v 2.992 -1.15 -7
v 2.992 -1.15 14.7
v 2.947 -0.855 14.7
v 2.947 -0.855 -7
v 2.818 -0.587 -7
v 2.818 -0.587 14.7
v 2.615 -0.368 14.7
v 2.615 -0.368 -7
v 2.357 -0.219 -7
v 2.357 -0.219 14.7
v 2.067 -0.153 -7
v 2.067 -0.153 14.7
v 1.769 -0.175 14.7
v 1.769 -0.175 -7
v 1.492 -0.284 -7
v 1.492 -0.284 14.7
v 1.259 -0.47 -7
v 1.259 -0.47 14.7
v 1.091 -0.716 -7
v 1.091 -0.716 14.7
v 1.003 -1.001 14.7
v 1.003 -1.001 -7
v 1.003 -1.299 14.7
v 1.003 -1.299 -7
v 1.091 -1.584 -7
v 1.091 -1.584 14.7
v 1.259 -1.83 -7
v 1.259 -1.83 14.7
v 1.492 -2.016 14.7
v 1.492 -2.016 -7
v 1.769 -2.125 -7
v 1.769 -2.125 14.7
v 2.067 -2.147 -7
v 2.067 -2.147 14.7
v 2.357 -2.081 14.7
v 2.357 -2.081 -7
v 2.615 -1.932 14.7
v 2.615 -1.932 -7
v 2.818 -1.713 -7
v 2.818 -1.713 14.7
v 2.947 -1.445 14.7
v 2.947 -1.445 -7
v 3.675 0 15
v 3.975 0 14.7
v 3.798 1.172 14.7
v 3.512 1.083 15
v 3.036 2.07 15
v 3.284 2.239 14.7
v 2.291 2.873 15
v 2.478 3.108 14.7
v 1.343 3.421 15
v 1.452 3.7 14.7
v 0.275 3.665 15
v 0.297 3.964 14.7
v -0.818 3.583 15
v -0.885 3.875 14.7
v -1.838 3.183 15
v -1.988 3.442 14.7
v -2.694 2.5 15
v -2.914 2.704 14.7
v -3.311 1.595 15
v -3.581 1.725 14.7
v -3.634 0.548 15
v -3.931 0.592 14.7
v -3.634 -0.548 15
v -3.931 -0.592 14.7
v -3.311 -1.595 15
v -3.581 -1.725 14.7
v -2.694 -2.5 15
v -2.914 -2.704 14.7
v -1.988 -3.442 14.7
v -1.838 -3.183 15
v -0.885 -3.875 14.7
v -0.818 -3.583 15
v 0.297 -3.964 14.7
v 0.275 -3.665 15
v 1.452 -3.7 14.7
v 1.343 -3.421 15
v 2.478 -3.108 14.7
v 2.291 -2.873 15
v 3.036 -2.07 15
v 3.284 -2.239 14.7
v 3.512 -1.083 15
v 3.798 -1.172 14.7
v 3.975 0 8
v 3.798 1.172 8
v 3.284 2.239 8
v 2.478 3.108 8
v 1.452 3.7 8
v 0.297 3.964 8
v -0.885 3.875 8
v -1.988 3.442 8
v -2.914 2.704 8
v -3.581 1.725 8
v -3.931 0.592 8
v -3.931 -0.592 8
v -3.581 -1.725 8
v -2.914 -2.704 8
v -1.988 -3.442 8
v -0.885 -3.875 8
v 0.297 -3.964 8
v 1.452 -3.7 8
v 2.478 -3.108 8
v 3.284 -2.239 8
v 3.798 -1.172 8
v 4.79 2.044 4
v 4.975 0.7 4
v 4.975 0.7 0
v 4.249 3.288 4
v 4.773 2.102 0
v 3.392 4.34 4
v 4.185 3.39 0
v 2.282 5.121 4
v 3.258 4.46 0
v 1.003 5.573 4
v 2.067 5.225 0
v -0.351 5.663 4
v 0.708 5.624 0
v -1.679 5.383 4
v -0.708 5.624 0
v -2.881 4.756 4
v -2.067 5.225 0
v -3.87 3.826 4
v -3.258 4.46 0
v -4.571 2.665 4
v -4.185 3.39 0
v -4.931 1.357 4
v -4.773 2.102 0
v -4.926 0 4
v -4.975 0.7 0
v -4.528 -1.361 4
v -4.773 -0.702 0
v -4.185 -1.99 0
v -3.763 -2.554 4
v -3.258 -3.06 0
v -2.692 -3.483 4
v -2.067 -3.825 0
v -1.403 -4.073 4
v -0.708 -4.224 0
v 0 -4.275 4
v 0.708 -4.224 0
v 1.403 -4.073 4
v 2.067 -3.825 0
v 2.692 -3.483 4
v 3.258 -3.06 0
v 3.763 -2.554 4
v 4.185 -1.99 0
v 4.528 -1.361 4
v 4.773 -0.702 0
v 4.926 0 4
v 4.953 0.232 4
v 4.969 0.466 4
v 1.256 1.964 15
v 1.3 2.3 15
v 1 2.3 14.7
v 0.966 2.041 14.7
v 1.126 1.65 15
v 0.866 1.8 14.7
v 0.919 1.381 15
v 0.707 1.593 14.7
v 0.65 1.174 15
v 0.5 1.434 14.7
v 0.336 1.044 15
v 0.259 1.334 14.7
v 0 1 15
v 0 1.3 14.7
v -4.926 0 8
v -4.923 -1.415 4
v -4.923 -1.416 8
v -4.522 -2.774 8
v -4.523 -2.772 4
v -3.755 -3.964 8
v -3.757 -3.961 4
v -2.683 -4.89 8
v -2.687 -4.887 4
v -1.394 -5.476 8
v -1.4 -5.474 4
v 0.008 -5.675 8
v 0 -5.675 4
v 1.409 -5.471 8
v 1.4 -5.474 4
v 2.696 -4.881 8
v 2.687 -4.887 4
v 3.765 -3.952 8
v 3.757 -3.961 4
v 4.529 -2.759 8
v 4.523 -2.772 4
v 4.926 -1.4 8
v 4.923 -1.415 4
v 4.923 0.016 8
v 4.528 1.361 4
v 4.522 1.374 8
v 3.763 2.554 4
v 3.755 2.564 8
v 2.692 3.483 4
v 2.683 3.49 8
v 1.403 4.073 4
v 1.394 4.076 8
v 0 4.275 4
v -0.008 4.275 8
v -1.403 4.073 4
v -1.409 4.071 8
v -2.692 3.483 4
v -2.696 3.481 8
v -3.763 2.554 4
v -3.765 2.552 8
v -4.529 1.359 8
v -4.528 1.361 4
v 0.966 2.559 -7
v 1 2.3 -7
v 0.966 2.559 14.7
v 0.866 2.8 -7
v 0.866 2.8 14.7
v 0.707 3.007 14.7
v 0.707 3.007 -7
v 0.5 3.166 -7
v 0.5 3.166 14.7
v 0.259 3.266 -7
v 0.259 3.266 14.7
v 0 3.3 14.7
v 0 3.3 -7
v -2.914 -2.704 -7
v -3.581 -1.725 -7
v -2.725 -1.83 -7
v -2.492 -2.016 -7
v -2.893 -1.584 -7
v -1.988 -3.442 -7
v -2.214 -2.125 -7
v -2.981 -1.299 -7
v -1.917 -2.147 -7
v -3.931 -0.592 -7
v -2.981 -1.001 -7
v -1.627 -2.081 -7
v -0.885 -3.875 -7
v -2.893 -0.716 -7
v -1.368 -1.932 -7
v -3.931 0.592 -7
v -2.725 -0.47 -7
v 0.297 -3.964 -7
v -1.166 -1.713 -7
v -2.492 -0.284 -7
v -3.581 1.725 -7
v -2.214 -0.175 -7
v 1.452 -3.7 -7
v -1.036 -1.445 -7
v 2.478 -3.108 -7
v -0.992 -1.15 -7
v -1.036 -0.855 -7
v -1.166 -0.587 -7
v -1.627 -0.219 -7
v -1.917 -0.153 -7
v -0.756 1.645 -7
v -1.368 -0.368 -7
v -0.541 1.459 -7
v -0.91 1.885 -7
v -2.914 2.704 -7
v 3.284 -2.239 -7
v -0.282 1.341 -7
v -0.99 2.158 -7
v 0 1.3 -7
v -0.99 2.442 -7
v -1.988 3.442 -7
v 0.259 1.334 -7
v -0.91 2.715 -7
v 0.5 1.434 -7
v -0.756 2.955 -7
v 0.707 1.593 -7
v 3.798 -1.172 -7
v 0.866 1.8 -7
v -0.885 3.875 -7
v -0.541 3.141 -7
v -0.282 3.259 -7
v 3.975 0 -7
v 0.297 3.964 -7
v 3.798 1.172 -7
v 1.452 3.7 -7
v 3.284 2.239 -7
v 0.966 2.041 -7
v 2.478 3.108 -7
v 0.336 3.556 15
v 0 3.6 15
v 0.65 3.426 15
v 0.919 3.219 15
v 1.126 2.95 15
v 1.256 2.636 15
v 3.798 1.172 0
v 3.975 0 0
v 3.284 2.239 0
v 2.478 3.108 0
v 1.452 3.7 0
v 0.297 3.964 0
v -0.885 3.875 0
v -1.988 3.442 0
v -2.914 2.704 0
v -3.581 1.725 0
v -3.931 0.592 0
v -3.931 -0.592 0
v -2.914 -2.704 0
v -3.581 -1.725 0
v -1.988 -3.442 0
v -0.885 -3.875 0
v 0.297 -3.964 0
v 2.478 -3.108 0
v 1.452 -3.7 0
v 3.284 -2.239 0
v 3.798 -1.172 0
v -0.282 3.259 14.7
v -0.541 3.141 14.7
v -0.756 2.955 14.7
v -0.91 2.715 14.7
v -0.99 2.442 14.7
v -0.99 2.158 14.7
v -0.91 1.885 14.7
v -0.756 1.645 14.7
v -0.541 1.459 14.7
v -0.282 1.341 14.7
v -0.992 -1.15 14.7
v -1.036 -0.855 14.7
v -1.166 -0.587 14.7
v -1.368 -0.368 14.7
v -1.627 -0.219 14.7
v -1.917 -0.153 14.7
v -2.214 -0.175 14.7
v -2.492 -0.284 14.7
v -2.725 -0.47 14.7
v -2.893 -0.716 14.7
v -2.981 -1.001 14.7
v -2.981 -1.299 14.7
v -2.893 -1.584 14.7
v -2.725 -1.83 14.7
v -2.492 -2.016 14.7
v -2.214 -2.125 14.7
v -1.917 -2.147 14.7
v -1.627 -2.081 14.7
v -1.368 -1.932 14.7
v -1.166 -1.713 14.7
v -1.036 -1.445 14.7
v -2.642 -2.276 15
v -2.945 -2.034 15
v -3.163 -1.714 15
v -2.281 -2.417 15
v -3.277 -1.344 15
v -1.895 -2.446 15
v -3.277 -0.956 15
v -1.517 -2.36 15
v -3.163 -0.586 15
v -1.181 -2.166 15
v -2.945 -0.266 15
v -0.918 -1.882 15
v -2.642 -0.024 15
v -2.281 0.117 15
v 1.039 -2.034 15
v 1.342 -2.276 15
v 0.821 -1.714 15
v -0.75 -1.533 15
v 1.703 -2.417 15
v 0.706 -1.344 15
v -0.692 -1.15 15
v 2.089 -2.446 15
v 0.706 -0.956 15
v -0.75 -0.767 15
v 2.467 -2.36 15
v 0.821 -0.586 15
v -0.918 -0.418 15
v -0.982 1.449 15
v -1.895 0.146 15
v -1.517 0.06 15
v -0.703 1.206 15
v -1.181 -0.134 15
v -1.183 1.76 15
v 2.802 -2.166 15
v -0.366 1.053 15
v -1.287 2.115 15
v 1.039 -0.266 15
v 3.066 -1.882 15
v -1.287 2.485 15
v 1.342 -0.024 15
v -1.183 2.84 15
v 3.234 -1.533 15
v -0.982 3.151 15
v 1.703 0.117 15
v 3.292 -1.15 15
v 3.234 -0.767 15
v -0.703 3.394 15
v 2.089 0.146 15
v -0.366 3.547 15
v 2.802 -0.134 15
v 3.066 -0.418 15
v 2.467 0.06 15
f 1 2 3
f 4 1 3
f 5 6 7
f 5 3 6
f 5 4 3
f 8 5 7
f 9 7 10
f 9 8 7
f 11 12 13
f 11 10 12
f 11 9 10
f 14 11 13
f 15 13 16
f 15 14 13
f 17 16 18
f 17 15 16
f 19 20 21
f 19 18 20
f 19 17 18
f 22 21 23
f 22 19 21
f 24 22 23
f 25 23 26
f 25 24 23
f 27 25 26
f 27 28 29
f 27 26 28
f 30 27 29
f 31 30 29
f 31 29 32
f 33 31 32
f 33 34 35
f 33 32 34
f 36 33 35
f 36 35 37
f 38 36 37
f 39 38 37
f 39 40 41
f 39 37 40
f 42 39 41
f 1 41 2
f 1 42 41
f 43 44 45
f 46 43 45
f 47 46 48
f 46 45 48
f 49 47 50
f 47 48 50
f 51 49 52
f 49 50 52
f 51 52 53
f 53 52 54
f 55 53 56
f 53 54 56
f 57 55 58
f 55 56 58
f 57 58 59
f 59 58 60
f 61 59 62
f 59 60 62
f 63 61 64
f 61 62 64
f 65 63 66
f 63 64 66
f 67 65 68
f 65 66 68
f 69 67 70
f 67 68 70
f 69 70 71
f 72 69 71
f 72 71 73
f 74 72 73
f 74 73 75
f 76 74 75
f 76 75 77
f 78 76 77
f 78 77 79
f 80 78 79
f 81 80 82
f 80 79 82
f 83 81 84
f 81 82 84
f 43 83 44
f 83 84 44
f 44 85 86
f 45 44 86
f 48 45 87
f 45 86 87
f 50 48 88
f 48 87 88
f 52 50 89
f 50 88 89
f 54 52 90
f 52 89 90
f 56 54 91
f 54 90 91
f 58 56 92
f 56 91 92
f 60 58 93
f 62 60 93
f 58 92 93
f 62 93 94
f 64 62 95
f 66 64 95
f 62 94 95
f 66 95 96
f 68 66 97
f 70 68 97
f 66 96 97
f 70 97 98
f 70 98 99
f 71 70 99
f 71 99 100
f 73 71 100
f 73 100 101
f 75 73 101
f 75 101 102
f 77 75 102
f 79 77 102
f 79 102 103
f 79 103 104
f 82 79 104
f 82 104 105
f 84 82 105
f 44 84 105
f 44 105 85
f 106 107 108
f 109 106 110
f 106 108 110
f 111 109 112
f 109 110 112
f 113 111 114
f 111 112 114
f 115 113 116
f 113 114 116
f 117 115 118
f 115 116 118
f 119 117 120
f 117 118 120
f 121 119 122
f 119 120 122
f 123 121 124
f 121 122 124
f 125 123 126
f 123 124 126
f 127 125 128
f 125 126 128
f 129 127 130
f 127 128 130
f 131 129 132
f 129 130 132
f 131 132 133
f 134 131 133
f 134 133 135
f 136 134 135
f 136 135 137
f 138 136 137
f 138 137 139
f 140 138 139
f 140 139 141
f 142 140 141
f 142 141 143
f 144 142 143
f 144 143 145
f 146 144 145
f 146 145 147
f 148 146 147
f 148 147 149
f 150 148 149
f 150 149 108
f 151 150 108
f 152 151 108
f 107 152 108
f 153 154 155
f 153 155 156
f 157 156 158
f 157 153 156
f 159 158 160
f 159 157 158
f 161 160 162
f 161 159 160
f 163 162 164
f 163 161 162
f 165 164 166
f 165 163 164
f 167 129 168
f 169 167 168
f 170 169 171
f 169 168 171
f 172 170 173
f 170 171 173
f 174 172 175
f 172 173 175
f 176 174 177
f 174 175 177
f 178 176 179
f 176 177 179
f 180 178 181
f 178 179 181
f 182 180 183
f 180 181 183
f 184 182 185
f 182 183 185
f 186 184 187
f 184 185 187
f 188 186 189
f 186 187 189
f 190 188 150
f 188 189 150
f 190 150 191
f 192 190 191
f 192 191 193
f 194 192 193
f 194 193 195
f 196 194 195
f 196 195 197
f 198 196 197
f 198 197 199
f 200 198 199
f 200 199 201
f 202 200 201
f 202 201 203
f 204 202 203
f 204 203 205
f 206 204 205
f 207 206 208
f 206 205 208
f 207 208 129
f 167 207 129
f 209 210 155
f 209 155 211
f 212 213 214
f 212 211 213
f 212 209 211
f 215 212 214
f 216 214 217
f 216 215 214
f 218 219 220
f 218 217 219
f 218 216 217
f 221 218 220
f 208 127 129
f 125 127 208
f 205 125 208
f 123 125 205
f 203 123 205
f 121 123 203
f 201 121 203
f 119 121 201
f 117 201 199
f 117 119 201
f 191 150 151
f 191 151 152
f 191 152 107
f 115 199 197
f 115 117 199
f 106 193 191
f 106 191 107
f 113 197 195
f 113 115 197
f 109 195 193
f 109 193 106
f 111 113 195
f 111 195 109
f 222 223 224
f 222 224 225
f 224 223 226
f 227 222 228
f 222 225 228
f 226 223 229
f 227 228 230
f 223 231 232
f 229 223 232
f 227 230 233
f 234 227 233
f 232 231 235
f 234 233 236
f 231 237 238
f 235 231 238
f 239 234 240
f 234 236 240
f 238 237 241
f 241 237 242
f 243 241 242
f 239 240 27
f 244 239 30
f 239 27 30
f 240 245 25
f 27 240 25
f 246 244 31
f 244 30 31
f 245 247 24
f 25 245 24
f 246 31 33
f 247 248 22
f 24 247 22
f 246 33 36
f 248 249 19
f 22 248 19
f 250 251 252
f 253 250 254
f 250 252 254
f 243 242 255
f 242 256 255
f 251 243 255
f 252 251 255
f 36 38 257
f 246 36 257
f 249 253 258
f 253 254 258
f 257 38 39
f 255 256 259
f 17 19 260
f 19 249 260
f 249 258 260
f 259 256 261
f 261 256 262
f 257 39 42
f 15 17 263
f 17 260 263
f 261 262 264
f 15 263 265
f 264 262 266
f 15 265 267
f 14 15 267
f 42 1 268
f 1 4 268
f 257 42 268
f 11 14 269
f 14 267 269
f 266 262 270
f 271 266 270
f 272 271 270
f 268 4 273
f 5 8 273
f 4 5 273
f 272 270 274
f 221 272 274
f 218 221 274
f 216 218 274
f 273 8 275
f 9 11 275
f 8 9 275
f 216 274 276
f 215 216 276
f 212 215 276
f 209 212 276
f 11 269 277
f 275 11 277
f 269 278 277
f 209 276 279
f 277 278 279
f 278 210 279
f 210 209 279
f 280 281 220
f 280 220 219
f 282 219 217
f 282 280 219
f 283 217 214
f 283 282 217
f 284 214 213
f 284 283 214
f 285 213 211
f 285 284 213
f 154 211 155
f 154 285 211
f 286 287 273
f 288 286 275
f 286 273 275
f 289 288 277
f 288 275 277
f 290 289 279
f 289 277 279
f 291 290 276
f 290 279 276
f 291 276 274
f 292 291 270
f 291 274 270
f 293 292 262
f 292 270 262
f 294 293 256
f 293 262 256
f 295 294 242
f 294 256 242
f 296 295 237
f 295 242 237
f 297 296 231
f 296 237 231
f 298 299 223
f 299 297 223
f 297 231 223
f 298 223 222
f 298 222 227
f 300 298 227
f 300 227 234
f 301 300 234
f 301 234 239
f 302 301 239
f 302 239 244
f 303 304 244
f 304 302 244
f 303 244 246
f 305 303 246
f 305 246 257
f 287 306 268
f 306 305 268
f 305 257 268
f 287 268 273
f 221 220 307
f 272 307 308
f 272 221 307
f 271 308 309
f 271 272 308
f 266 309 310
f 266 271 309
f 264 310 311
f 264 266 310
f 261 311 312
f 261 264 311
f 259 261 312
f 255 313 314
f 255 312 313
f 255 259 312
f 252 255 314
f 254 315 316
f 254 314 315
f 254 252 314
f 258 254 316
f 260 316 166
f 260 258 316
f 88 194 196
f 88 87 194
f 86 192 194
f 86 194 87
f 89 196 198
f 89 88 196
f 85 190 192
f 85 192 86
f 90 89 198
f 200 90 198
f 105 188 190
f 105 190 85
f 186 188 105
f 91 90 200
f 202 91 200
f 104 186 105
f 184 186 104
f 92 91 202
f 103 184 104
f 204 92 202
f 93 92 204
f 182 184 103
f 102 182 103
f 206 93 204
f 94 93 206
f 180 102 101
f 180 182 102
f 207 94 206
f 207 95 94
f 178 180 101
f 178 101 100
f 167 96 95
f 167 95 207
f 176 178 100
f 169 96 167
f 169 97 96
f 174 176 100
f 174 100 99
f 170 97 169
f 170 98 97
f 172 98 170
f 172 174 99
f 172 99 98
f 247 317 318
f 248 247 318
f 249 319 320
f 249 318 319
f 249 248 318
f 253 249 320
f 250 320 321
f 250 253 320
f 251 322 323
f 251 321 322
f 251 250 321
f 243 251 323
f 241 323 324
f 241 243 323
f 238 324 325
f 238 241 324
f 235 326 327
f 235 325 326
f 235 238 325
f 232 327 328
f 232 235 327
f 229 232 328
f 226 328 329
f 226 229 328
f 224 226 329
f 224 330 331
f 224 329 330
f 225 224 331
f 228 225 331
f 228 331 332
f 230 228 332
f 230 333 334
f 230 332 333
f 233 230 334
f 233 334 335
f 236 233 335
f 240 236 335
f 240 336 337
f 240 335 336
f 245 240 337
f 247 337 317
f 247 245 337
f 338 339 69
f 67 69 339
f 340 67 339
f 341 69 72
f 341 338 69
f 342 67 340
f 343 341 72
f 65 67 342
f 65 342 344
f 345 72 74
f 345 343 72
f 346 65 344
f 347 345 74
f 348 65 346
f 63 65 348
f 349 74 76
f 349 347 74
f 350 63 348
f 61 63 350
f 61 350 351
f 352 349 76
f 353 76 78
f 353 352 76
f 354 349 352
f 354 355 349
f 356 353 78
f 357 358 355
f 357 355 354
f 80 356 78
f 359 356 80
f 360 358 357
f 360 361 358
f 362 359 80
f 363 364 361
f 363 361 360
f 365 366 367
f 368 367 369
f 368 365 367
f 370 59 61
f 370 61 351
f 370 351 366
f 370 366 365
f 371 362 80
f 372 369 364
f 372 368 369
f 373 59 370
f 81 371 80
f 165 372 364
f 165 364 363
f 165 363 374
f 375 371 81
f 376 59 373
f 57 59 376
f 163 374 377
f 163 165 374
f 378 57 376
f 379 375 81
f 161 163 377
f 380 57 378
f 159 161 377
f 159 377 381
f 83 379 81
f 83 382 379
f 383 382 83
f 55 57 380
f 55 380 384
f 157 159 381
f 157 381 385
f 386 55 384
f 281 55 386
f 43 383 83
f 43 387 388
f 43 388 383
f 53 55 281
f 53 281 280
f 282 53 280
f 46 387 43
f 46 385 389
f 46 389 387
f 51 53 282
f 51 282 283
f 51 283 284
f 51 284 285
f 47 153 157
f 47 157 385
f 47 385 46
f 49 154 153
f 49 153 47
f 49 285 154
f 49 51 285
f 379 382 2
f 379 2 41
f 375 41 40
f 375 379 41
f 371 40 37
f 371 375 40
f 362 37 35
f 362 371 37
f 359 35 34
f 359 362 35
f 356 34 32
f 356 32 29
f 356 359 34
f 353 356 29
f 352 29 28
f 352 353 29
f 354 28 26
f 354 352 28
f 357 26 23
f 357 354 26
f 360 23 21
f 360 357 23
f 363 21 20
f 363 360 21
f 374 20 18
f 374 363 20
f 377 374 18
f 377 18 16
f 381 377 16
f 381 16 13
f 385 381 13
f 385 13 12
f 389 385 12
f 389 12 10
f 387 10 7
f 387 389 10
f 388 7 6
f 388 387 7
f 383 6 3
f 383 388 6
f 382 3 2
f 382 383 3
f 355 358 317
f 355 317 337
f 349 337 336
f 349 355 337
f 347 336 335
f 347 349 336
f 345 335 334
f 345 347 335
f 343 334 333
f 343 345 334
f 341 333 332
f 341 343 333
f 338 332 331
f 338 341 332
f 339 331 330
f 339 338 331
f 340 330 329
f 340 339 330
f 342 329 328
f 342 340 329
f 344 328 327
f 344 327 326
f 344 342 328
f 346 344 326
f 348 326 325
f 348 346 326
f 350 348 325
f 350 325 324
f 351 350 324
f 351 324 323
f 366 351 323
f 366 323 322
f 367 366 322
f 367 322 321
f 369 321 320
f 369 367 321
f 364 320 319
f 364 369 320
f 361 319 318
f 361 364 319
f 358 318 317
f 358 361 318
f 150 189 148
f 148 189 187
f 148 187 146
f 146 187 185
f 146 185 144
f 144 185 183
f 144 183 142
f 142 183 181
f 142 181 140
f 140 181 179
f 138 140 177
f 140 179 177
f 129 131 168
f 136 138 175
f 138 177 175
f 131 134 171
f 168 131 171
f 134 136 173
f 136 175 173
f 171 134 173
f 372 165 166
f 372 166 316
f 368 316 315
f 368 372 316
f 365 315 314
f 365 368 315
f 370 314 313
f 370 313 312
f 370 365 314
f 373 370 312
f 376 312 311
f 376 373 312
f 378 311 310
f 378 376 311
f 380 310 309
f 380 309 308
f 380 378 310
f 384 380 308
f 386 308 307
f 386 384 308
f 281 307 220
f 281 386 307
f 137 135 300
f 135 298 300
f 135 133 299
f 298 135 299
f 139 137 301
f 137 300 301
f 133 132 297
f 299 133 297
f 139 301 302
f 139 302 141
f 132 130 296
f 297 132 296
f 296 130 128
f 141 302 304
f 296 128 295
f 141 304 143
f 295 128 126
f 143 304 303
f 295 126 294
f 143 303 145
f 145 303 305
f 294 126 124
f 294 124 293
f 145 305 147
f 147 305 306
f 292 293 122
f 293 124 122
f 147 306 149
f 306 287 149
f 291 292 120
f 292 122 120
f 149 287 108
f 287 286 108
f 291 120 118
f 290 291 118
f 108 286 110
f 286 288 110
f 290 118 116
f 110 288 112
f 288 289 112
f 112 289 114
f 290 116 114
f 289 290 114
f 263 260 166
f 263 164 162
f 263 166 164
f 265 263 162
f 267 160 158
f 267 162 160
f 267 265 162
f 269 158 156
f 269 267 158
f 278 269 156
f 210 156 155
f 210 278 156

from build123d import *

# Parameters (mm, degrees)
SKETCH1_R                = 4.975
BOSS_EXTRUDE1_DEPTH      = 4
BOSS_EXTRUDE2_START      = 4
SKETCH2_R                = 4.975
BOSS_EXTRUDE2_DEPTH      = 4
BOSS_EXTRUDE5_DEPTH      = 15
BOSS_EXTRUDE5_DEPTH_BACK = 7
SKETCH5_R                = 3.975
CUT_EXTRUDE1_DEPTH       = 17.791552936
CUT_EXTRUDE1_DEPTH_BACK  = 17.791552936
SKETCH9_R                = 1
CHAMFER1_SIZE            = 0.3


with BuildPart() as part:
    # Sketch1 → Boss-Extrude1 (new body)
    with BuildSketch(Plane.XY):
        with Locations((0, 0.7)):
            Circle(SKETCH1_R)
    extrude(amount=BOSS_EXTRUDE1_DEPTH)

    # Sketch2 → Boss-Extrude2 (add)
    with BuildSketch(Plane.XY.offset(BOSS_EXTRUDE2_START)):
        with Locations(Location((0, -0.7, 0), (0, 0, 171.911442188))):
            Circle(SKETCH2_R)
    extrude(amount=BOSS_EXTRUDE2_DEPTH)

    # Sketch5 → Boss-Extrude5 (add, two sides: drawn at the far end of the back side and taken through both)
    with BuildSketch(Plane.XY.offset(-BOSS_EXTRUDE5_DEPTH_BACK)):
        Circle(SKETCH5_R)
    extrude(amount=BOSS_EXTRUDE5_DEPTH + BOSS_EXTRUDE5_DEPTH_BACK)

    # Sketch9 → Cut-Extrude1 (cut, two sides: drawn at the far end of the back side and taken through both)
    with BuildSketch(Plane.XY.offset(-CUT_EXTRUDE1_DEPTH_BACK)):
        with BuildLine():
            ThreePointArc((0, 3.3), (-1, 2.3), (0, 1.3))
            Line((0, 1.3), (0, 3.3))
        make_face()
        with BuildLine():
            Line((0, 3.3), (0, 1.3))
            ThreePointArc((0, 1.3), (0.707106781, 1.592893219), (1, 2.3))
            ThreePointArc((1, 2.3), (0.707106781, 3.007106781), (0, 3.3))
        make_face()
        with Locations((-1.991858429, -1.15)):
            Circle(SKETCH9_R)
        with Locations((1.991858429, -1.15)):
            Circle(SKETCH9_R)
    extrude(amount=CUT_EXTRUDE1_DEPTH + CUT_EXTRUDE1_DEPTH_BACK, mode=Mode.SUBTRACT)

    # Chamfer1
    chamfer1_edges = [part.edges().sort_by_distance(p)[0] for p in [
        (-3.975, 0, 15),
        (0, 1.3, 15),
        (-2.991858429, -1.15, 15),
        (0.991858429, -1.15, 15),
    ]]
    chamfer(chamfer1_edges, length=CHAMFER1_SIZE)


solid = part.part
